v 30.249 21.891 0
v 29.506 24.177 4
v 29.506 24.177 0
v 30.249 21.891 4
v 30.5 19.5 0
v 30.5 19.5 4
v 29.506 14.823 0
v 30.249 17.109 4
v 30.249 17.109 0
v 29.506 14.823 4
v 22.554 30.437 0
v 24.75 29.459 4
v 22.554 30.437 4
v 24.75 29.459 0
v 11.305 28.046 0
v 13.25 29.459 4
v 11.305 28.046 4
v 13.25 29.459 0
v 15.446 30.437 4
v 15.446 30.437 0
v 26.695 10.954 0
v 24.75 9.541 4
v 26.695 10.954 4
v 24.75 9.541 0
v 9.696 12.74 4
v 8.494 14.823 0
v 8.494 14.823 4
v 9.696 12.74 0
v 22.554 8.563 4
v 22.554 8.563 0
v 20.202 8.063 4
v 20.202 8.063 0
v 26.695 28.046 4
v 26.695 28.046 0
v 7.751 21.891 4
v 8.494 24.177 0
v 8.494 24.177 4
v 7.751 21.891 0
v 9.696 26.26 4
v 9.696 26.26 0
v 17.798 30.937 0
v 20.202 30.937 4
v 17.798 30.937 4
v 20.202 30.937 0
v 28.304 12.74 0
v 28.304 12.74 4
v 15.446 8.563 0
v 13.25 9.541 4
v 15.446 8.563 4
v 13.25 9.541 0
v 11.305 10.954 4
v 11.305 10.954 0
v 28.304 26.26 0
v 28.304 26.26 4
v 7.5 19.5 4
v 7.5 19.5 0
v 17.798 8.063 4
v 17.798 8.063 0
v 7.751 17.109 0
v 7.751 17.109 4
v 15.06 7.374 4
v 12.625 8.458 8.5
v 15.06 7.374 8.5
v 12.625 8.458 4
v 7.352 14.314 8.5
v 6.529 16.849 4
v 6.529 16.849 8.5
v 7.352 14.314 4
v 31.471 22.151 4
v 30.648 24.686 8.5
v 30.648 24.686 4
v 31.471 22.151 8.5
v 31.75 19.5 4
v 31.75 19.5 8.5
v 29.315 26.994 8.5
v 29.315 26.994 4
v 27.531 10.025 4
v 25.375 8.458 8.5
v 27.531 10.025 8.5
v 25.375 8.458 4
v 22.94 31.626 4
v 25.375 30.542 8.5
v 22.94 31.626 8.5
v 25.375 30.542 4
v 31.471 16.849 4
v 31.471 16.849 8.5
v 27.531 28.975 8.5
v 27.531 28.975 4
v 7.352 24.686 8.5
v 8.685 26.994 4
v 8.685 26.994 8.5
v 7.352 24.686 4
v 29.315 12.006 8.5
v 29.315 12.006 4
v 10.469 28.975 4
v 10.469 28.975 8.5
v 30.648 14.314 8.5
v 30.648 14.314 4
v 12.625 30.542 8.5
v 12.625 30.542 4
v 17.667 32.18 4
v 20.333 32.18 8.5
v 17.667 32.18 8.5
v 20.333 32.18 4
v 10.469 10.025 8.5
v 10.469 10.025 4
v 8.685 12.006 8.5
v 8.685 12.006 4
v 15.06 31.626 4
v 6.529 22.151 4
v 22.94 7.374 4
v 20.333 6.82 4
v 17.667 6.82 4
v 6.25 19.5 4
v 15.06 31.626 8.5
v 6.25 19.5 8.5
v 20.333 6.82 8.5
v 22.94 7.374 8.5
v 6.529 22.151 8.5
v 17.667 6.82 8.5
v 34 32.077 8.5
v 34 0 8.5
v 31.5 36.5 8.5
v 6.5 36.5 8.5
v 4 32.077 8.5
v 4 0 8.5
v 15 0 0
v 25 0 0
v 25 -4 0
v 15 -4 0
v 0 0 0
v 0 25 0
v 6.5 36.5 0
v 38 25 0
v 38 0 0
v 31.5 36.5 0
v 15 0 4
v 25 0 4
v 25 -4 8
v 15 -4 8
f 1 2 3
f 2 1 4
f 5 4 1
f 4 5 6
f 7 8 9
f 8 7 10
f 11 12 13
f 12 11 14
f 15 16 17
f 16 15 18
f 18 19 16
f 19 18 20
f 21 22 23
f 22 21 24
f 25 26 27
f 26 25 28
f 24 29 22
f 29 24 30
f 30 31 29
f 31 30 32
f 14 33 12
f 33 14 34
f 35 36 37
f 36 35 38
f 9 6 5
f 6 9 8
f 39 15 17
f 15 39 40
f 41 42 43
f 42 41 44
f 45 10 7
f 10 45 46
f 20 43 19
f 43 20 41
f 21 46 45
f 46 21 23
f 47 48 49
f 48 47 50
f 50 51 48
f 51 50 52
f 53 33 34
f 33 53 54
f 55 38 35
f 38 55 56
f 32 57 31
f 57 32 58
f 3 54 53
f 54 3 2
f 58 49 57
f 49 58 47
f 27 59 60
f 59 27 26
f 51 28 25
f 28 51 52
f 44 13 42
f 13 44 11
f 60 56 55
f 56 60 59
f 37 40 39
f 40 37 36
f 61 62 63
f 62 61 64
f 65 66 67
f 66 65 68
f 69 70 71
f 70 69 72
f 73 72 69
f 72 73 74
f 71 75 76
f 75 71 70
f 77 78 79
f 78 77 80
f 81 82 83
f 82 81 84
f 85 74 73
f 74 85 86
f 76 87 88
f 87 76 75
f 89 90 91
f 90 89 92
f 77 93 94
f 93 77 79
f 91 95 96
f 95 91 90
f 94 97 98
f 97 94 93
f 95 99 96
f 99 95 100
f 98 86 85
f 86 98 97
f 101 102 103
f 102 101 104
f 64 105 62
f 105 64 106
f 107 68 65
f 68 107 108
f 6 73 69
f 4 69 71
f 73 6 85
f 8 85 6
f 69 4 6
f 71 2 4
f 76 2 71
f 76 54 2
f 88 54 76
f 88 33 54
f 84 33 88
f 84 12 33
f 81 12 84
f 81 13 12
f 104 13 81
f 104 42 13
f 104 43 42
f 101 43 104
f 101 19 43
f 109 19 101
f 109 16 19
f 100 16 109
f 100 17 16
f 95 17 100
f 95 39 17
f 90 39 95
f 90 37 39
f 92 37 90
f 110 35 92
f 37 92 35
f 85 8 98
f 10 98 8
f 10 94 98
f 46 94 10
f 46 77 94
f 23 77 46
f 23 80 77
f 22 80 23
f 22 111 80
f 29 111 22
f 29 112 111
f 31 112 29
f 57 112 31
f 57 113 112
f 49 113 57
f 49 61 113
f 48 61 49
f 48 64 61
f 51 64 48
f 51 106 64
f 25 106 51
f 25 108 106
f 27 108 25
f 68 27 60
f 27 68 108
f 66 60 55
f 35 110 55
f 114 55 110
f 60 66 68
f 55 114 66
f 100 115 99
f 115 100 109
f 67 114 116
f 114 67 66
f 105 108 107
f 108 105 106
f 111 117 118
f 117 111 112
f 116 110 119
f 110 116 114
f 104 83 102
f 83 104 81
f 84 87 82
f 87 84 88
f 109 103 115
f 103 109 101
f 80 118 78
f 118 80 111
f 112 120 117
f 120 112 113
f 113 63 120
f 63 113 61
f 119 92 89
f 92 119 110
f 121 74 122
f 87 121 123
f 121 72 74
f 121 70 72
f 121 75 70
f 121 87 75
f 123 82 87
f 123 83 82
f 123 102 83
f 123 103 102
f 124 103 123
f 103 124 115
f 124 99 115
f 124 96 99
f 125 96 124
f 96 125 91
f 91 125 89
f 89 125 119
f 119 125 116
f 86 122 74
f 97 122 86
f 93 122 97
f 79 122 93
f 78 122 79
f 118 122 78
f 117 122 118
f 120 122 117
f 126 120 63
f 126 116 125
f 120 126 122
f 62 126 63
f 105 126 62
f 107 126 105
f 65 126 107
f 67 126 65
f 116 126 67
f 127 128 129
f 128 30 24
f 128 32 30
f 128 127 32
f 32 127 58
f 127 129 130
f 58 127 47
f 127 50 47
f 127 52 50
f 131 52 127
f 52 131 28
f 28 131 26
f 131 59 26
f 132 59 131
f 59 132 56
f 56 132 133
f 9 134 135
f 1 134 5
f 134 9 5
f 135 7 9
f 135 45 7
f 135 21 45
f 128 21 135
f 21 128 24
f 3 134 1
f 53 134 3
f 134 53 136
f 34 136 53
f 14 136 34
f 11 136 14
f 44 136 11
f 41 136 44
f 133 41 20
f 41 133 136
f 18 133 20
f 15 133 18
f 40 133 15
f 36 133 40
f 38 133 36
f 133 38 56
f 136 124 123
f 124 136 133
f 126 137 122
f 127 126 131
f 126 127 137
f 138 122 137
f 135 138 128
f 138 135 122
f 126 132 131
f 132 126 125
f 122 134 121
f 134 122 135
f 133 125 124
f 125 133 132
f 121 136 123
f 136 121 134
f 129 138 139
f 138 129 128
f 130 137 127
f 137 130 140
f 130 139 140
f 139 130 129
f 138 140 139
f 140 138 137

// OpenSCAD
difference(){
cube([38,36.5,8.5]);

rotate([0,atan(4/8.5),0])translate([-8,0,0])cube([8,40,15]);

translate([38,0,0])rotate([0,-atan(4/8.5),0])cube([8,40,15]);

translate([0,25,0])
rotate([0,0,-atan(6.5/11.5)])
mirror([1,0,0])
cube([8,20,15]);

translate([38,0,0])
mirror([1,0,0])
translate([0,25,0])
rotate([0,0,-atan(6.5/11.5)])
mirror([1,0,0])
cube([8,20,15]);


translate([19,19.5,-1])
union(){cylinder(h = 10, d=23);translate([0,0,5])cylinder(h = 5, d=25.5);}

}

translate([15,-4,0])
difference(){
cube([10,8,8.5]);
translate([0,8,0])rotate([45,0,0])cube([12,12,12]);
}
